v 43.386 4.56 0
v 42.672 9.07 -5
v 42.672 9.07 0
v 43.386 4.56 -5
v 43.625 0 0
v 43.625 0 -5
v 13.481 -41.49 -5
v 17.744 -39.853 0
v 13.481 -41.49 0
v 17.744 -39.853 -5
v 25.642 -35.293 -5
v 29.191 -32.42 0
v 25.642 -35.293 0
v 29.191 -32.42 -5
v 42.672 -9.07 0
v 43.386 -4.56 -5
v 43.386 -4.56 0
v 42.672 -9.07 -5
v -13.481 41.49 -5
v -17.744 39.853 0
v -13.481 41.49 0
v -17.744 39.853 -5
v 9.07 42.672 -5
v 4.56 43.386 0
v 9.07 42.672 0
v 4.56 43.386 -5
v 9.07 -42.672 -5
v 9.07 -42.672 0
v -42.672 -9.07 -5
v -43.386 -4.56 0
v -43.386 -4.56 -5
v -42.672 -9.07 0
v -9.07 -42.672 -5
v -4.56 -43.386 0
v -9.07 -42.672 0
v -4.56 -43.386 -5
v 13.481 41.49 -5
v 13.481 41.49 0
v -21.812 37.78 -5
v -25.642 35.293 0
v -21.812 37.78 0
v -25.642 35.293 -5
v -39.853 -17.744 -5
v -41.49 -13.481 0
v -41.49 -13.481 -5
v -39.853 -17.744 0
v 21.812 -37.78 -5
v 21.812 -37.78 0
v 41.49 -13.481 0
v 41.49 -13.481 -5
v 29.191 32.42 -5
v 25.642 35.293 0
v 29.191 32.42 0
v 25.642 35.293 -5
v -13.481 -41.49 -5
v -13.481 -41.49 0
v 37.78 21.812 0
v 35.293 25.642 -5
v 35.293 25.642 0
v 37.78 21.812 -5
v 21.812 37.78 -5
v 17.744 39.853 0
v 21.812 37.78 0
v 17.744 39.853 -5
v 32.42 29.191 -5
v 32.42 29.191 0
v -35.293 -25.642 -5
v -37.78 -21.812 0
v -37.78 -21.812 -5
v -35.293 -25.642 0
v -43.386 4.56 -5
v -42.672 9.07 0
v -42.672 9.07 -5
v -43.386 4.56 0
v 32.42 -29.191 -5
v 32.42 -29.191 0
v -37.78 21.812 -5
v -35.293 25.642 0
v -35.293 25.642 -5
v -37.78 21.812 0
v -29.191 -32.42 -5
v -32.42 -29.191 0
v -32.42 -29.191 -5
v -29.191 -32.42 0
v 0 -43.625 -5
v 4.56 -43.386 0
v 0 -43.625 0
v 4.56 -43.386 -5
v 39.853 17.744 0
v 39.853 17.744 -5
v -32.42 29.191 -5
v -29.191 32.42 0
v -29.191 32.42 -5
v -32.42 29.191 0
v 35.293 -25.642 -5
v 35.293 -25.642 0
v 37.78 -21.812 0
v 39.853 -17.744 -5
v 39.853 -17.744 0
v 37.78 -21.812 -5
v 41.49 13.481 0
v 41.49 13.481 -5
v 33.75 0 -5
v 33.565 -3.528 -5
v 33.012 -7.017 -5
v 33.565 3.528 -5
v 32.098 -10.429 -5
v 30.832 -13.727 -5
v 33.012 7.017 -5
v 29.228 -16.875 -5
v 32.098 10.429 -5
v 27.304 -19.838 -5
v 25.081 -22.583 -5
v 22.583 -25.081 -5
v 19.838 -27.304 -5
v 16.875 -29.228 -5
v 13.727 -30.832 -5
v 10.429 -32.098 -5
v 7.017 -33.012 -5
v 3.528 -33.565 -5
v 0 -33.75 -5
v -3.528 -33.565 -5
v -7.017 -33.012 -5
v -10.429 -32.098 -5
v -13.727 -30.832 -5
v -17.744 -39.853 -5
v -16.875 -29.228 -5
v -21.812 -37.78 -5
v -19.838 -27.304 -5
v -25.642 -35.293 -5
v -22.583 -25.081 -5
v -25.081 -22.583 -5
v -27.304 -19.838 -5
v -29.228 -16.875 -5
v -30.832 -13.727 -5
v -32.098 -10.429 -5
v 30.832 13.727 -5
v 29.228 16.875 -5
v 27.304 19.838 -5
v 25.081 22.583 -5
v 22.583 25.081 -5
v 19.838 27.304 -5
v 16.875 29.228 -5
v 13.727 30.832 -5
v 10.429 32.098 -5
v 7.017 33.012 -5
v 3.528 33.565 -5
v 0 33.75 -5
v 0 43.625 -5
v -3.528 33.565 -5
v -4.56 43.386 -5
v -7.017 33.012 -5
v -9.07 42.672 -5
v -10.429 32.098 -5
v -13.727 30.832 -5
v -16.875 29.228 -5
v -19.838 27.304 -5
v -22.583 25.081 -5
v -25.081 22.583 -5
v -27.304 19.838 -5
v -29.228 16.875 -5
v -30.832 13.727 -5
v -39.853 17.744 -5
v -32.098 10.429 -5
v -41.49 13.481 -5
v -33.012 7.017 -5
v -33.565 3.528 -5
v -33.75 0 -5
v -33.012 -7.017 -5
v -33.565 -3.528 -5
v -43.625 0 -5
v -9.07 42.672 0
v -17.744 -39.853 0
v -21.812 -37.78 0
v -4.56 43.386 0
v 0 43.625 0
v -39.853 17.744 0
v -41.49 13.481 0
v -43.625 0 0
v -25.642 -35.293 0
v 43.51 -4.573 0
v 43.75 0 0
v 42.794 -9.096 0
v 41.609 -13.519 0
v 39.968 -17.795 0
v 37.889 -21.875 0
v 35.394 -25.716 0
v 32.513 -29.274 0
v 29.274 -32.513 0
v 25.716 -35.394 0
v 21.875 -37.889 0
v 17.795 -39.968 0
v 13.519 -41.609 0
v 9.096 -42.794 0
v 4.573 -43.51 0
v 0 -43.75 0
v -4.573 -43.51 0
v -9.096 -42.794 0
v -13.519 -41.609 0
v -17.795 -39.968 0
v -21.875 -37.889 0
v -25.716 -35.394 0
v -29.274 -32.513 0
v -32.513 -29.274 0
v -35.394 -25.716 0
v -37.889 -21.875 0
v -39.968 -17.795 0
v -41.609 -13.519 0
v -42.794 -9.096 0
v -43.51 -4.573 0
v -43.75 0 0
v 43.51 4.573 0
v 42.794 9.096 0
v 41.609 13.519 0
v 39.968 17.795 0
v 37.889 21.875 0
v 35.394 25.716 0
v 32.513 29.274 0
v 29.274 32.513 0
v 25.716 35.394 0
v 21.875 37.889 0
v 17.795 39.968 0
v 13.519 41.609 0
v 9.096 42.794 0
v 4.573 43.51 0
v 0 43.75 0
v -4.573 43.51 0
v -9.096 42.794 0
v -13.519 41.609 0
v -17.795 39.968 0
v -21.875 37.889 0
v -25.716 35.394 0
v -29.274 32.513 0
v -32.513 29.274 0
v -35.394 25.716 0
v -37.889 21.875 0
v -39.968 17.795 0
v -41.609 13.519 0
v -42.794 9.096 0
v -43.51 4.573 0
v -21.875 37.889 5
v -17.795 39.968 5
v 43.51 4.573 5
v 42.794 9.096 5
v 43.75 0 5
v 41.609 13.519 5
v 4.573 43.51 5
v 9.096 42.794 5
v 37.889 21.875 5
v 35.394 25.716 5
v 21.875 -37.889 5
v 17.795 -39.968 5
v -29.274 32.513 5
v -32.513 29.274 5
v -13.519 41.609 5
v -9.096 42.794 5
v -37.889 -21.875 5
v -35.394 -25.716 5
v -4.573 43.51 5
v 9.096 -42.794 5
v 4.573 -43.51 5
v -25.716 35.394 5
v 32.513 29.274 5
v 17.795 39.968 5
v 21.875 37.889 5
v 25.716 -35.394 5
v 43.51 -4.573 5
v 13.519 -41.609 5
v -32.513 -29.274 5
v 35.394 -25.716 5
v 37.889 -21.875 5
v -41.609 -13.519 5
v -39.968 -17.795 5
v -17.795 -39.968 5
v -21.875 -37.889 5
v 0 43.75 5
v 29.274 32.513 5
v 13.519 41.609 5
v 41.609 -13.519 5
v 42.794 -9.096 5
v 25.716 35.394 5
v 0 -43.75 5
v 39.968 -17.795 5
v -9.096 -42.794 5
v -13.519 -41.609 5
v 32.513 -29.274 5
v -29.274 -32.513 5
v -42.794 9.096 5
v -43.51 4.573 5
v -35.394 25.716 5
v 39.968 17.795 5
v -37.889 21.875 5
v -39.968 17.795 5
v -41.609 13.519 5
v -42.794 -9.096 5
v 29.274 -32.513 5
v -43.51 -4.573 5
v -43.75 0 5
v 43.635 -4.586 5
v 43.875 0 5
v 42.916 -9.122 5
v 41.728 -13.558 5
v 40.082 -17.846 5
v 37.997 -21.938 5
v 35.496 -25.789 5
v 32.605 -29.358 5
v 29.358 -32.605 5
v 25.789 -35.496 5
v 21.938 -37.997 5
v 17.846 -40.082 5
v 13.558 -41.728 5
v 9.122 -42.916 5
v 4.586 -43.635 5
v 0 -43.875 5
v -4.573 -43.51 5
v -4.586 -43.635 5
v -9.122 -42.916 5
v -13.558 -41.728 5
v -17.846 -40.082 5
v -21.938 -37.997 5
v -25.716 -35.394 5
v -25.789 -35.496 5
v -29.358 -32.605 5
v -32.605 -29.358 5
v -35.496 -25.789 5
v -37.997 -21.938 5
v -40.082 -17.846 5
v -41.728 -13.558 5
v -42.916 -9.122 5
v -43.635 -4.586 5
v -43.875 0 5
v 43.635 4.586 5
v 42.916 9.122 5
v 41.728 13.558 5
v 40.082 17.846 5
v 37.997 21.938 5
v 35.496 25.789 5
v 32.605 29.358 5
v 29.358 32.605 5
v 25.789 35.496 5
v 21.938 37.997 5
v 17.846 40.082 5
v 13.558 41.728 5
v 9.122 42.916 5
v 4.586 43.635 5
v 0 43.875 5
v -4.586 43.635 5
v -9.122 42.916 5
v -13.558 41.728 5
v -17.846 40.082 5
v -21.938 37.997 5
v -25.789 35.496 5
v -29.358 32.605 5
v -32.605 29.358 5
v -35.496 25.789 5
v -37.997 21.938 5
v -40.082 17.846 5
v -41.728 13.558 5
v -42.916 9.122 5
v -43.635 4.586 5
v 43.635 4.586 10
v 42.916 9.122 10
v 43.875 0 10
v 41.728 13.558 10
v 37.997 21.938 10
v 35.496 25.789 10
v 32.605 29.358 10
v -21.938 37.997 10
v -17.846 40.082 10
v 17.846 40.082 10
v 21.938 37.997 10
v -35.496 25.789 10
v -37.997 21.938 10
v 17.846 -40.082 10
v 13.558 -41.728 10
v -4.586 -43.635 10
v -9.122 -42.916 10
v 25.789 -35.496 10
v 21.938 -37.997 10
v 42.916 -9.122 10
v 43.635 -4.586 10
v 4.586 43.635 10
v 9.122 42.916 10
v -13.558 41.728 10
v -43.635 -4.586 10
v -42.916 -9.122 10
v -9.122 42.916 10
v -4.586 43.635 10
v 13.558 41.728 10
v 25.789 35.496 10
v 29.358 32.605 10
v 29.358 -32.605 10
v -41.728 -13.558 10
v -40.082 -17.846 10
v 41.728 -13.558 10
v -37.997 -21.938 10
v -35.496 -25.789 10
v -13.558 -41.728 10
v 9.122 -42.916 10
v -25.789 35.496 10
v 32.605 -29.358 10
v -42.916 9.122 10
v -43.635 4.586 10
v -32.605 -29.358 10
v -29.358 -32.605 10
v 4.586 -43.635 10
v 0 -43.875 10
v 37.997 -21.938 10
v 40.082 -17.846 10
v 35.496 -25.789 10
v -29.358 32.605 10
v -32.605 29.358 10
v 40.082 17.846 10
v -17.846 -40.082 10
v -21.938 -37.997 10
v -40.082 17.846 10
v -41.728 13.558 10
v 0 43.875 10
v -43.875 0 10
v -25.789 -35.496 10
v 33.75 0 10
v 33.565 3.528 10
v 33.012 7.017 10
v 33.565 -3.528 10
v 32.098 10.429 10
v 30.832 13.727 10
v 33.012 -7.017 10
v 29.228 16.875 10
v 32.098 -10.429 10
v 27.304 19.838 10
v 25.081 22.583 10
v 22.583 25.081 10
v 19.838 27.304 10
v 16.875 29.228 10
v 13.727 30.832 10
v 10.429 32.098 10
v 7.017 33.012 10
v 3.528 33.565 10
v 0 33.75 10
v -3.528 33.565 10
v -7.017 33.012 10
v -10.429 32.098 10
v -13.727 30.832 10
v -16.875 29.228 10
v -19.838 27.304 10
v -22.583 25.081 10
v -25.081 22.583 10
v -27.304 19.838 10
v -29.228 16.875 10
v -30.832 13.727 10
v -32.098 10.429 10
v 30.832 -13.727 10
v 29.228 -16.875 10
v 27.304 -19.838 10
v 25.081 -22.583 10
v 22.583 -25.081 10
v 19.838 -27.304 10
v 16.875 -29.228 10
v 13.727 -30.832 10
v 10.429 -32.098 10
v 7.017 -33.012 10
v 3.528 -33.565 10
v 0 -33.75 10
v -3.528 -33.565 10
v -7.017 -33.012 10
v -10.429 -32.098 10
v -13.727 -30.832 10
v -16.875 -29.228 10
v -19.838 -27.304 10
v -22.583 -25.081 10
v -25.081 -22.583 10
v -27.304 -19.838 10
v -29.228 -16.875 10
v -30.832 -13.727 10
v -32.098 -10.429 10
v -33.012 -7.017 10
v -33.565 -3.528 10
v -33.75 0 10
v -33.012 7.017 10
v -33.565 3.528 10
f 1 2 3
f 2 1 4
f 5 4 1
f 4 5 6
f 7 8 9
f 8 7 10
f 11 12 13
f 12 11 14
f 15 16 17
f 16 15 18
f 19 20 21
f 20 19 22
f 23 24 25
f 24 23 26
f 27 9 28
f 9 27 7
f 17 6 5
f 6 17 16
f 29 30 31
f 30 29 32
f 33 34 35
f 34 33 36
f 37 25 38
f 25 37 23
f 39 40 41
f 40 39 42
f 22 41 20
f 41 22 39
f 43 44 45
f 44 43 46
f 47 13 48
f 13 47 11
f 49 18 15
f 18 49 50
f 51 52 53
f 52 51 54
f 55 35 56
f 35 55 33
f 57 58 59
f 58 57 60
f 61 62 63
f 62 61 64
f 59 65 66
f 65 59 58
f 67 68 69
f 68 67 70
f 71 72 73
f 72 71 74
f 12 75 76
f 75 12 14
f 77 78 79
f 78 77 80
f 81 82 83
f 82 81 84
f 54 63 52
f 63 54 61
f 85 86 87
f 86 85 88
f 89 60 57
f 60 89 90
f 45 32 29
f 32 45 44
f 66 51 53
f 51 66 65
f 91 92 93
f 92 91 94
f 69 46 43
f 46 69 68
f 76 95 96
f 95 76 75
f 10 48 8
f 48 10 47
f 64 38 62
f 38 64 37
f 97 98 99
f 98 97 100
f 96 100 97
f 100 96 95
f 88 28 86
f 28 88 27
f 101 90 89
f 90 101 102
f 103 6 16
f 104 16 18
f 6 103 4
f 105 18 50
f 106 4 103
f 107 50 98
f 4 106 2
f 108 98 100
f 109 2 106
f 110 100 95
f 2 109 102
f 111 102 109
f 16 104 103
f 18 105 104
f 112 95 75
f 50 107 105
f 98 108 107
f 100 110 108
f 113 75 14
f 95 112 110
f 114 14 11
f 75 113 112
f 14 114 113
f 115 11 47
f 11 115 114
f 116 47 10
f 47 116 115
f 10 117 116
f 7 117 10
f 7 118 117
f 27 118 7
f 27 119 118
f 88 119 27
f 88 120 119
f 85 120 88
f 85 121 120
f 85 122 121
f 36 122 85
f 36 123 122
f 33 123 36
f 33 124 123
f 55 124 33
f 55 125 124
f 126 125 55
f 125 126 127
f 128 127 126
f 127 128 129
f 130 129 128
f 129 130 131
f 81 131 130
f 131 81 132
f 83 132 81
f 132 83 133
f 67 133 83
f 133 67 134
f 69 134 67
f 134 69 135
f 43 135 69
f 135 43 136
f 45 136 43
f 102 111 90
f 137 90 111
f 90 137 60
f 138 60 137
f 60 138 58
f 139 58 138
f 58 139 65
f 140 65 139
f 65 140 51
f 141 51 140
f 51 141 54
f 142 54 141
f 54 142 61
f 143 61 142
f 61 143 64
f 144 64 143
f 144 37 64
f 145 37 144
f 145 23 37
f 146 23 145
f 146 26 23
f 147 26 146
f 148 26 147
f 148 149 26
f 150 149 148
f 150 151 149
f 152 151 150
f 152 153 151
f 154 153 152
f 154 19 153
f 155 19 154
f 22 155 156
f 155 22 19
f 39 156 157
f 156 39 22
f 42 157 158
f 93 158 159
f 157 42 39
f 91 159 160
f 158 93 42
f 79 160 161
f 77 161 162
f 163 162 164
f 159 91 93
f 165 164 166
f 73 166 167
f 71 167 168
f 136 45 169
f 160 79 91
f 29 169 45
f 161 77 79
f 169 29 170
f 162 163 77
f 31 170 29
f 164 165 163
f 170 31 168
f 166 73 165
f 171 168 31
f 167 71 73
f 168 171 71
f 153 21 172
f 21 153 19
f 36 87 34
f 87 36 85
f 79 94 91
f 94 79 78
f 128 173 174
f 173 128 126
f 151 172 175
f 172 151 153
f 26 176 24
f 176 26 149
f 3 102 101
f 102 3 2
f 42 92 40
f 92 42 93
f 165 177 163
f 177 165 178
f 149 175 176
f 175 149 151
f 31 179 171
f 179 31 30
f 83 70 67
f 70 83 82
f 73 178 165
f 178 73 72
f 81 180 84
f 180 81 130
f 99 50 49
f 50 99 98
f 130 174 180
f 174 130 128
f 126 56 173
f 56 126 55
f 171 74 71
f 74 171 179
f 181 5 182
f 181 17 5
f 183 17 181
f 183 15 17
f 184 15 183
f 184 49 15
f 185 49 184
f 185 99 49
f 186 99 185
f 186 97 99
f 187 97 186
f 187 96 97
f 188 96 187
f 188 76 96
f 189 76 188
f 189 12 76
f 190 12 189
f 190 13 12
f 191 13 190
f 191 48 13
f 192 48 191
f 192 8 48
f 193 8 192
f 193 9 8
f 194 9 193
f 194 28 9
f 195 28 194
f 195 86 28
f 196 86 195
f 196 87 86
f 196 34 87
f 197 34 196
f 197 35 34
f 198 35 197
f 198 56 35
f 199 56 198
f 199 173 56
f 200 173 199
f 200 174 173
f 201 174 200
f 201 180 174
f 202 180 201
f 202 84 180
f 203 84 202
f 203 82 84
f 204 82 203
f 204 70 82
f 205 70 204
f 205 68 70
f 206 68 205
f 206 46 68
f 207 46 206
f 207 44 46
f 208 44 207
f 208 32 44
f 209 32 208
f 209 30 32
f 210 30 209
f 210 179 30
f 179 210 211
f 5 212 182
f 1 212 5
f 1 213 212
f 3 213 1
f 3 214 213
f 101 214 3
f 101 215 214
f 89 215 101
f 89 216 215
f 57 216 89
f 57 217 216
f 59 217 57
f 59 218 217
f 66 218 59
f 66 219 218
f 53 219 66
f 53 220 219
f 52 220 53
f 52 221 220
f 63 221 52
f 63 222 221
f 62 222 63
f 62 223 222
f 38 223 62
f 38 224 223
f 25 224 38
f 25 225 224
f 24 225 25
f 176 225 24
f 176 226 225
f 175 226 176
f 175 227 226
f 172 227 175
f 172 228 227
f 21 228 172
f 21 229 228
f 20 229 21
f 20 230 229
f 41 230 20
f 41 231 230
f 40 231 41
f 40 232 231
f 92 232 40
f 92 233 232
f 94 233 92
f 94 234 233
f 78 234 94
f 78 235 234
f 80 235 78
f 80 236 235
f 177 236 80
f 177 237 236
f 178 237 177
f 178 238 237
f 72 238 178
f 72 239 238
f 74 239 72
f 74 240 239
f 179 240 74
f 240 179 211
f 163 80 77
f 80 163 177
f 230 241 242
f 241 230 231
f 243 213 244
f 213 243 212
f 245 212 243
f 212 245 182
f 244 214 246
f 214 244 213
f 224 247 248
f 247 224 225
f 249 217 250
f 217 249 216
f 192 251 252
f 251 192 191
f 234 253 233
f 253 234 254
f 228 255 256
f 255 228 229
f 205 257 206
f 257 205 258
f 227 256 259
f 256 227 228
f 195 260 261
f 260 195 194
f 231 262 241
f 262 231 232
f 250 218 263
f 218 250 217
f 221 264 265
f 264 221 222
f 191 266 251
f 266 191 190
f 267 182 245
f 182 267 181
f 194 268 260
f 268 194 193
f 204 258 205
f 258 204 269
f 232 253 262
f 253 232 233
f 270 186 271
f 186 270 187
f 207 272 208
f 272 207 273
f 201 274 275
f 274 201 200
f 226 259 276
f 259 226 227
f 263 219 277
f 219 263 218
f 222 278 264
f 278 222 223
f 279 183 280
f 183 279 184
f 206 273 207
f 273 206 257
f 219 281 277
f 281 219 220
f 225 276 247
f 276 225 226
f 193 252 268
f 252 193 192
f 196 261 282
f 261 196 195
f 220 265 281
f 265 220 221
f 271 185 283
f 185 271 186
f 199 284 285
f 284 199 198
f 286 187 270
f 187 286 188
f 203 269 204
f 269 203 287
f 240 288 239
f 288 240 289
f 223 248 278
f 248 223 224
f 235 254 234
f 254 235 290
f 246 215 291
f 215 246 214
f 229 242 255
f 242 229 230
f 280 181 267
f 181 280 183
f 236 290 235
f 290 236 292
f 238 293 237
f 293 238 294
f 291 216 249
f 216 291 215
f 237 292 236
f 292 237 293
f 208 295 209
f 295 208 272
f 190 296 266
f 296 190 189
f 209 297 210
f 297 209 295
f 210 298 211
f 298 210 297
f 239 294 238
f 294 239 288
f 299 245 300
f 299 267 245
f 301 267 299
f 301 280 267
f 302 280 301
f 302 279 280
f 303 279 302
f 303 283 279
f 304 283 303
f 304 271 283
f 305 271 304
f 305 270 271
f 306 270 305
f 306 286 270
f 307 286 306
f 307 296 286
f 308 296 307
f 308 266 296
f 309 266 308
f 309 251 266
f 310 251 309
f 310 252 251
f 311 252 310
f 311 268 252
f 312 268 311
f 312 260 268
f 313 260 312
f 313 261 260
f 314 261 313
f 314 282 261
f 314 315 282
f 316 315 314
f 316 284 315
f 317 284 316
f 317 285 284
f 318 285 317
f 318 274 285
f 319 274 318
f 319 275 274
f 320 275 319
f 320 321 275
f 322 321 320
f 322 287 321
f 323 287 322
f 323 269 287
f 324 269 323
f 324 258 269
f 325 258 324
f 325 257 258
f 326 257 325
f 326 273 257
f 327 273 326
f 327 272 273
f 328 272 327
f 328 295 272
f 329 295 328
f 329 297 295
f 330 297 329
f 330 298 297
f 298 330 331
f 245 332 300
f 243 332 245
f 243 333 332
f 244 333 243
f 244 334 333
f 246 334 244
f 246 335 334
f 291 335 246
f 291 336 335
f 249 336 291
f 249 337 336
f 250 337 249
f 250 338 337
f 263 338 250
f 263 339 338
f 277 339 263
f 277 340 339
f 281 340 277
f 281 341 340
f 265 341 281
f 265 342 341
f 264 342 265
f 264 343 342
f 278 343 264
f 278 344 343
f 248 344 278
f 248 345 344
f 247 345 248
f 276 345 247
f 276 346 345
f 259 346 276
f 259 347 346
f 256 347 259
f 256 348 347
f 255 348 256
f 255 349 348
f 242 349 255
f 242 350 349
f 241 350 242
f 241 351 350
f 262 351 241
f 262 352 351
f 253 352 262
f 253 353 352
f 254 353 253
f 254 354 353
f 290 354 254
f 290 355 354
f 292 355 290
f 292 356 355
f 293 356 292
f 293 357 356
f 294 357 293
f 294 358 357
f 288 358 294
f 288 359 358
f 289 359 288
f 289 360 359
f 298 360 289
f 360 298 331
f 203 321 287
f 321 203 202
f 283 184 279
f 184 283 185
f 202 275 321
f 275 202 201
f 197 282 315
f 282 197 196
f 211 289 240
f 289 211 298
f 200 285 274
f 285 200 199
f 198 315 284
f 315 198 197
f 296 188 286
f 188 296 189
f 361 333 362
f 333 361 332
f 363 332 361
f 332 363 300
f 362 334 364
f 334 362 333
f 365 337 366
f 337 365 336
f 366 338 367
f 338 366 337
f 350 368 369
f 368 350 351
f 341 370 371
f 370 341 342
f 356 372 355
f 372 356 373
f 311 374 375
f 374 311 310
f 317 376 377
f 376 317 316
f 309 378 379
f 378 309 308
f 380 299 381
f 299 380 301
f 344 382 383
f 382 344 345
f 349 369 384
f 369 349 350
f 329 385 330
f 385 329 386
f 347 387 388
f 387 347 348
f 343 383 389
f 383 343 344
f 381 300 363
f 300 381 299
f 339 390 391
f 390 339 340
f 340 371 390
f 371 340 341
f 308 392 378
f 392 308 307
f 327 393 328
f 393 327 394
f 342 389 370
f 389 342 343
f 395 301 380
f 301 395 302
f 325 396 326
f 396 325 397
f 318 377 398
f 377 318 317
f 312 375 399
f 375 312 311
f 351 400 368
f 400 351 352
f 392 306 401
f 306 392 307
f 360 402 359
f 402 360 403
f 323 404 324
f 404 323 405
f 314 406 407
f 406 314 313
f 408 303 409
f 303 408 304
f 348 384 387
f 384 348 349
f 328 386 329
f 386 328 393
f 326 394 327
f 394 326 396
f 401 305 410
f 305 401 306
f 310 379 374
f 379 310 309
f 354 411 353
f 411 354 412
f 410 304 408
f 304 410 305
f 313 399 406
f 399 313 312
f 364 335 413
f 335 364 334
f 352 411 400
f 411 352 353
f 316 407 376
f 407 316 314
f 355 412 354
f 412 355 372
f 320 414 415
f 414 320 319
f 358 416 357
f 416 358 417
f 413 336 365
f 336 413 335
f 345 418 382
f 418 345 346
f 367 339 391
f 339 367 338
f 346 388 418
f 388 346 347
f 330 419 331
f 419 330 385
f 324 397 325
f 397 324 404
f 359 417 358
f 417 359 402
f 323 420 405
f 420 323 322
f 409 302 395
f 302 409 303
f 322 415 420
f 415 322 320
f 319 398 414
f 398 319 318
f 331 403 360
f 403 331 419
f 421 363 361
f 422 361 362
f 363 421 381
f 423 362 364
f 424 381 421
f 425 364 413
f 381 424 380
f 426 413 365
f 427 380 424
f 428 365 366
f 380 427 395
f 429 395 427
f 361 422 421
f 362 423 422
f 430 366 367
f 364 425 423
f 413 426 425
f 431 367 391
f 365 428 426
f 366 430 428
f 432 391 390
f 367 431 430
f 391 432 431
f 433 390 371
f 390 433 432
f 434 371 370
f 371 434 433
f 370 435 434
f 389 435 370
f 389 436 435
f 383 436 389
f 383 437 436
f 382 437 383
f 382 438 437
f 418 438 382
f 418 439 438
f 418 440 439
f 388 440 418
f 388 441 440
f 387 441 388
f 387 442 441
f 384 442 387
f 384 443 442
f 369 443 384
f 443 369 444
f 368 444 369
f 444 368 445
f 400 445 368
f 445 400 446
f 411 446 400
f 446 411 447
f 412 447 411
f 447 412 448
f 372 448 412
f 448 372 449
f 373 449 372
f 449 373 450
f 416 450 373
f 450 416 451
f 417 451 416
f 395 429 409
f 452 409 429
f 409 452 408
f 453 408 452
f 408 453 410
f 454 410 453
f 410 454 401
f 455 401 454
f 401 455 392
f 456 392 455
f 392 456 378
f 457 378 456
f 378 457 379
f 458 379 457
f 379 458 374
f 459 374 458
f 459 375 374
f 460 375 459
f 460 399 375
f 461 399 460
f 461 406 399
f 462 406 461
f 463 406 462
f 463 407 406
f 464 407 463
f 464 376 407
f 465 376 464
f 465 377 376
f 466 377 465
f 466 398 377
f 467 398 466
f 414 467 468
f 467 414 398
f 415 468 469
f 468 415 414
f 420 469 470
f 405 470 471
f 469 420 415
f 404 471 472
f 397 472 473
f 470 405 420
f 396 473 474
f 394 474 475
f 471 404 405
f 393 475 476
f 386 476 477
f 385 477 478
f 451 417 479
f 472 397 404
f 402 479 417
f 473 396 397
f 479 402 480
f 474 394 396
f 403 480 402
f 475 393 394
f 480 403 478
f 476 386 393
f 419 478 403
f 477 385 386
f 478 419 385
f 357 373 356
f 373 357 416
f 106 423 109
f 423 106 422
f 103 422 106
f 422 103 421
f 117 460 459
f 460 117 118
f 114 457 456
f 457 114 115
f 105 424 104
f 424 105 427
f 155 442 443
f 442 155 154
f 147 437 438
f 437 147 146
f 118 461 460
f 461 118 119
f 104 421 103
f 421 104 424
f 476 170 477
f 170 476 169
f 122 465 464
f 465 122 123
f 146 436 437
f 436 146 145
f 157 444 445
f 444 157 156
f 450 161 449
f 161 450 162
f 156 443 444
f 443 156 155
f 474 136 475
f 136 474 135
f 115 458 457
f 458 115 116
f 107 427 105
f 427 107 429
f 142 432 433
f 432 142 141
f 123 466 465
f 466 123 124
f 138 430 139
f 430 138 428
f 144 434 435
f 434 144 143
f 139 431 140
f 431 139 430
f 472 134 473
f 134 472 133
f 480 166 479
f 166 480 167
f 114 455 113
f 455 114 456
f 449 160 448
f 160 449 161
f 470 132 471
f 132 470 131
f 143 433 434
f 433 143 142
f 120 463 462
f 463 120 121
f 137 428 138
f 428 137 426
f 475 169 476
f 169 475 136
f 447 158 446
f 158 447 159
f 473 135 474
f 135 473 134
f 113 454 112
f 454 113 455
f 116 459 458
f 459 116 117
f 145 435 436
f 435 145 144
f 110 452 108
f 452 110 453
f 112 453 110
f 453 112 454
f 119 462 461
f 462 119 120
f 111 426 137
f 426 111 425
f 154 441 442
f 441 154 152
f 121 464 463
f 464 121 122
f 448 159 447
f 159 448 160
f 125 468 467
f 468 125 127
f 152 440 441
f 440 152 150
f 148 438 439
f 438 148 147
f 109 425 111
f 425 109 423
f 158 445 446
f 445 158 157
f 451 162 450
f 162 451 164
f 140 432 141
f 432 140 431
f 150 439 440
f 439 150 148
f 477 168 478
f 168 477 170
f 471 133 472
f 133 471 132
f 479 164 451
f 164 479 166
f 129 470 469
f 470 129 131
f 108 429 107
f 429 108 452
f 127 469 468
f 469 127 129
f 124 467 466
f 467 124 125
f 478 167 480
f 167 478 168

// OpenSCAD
// file: qtpy.scad
qtpy_plate  = [18.0, 20.8, 1.6]; // from the adafruit website


module qtpy_model() {
    qtpy_offset = [1.975,  -9.6, -0.78]; // centering the model plate to [0,0,0]
    translate(qtpy_offset)
            import("5426 QT Py ESP32-S3.stl");
}


module _qtpy_mount() {
    intersection() {
        translate([-0.1, 21.2, 0])
        import("QTPy-Case-Bottom.stl");

        translate([0, 7.5, 0])
        cube([26, 16, 12], center=true);
    }
}


module qtpy_mount() {
    for (i=[0,1]) 
        mirror([0, i, 0])
            _qtpy_mount();
}


module qtpy_model_and_mount() {
    translate([0, 0, 2.3]) qtpy_model();
    qtpy_mount();
}
// file: WAGO_221_mount.scad
// ////////////////////////////////////////////////
//
// WAGO 221 mount
//
// Creates a single row or double row set of 221 blocks
// with mounting tabs/ears at either end.
//
// Created - 2017/01/01 by Joo Chung
//
//
// Downloaded from https://www.thingiverse.com/thing:2075219/
//
// - added an extra module `wago_mount(blocks, join=1)` to use it in another project
// - added an extra function `wago_mount_width(blocks)` for calculating the complete mount width
// - fixed warnings about calls to mirror() without vector
// - prefixed all functions and modules with `wago_` as a poor mans implementation of a namespace
// ////////////////////////////////////////////////

// ////////////////////////////////////////////////
// vector of blocks. each element specifies the number of conductors for that block
// EDIT THIS
blocks = [2,2,2,2,2]; // a single 5 conductor blocks
// blocks = [5, 3, 2]; // a set of 5 conductor, 3 conductor, 2 conductor blocks
// blocks = [5, 5, 5]; // a set of three 5 conductor blocks
// blocks = [2]; // a single 2 conductor block
// blocks = [3]; // a single 3 conductor block


// ////////////////////////////////////////////////
// Mirror the mount, stand it up, and put tabs on bottom.
// 0 - no mirror, 1 - mirror, rotate so its standing up, and reposition tabs
// 2 - mirror, rotate so that they are laying flat, and reposition tabs.
// EDIT THIS
body_shape = 0;

// ////////////////////////////////////////////////
// Tabs - include or exclude mounting tabs
// EDIT THIS: 0 - no tabs, 1 - tabs
tabs      =  1;
// EDIT THIS: radius of hole in tab
tabradius =  2.6;
// EDIT THIS: thickness of tab
tabheight =  4;
// EDIT THIS: Set width and length of the tab. (tab is basically a square)
tabwidth  = 10;



// ////////////////////////////////////////////////
// Block dimensions in mm -- DO NOT EDIT
conwidth   =  5.6; // width of a single conductor
// DO NOT EDIT
border     =  1.75; // block transparent plastic border
// DO NOT EDIT
blockdepth = 18.25;
// DO NOT EDIT
fudge      =  0.2;


// ////////////////////////////////////////////////
// OpenSCAD special variables -- DO NOT EDIT
$fa = 1;
// DO NOT EDIT
$fs = 0.4;


// ////////////////////////////////////////////////
// Functions

// block width
function wago_bw(x) = conwidth*x+border+fudge;

// mount width (list of blocks, index, max index)
function wago_mw(block_list, i, n) = ( i==0 ? wago_bw(block_list[i]) + 2 + wago_mw(block_list, i+1, n) : (i < n ? wago_bw(block_list[i]) + 2 + wago_mw(block_list, i+1, n) : 0));

// full mount width, including closing wall
function wago_mount_width(block_list) = wago_mw(block_list, 0, len(block_list))+ 2;

// ////////////////////////////////////////////////
// Modules

module wago_tab(width, hole, thickness) {
    difference() {
        union () {
            cylinder(thickness,width/2,width/2, true);
            translate([width/4,0,0]) cube([width/2,width,thickness], true);
        }
    cylinder(width,hole,hole, true);
    }
}


module wago_shoulder (depth) {
    difference () {
        union () {
            cube([2, blockdepth, 3.25], false);
            translate([0,0,3.25]) cube([2.25, blockdepth, 2], false);
        }
        translate([0,0,2]) cube([2.25,2,3.25], false);
        translate([2,blockdepth-4,2]) cube([0.25,4,3.25], false);
    }
}


module wago_backshoulder (height) {
    difference() {
        union() {
            translate([0, 2, 0]) cube ([2, 1.25, 10.15]);
            cube ([2.25, 2, 10.15]);
        }
        translate([0,0,10.15-2]) cube([2.25,3.25,2]);
        translate([2,0,2]) cube([1.25,3.25,3.25]);
    }
}


// WAGO 221 block
module wago_block (nconn) {
    blockwidth = wago_bw(nconn);

    // base
    translate([2,2,0]) cube([blockwidth, blockdepth, 2], false);

    // back headboard
    translate([0,blockdepth+2,0]) cube([blockwidth+4, 2, 10.15], false);

    // back lip
    translate([0,blockdepth,10.15]) cube([blockwidth+4, 4, 2], false);

    // front lip
    //translate([0,0,0]) cube([blockwidth+4, 2, 2.5], false);

    // left shoulder and right shoulders
    translate([0,2,0]) wago_shoulder();
    translate([blockwidth+4,2,0]) mirror([1,0,0]) wago_shoulder();

    // back left and shoulder
    translate([0, blockdepth-1.25, 0]) wago_backshoulder();
    translate([blockwidth+4, blockdepth -1.25, 0]) mirror([1,0,0]) wago_backshoulder();

}


module wago_mount(block_list=blocks, join=1) {
    // a single strip of wago mounts for use in other projects

    cut_size = [wago_mount_width(block_list) + 2, blockdepth + 4, 15];

    difference() {
        // mount, as defined by the original module
        translate([0, -2, -2])
            for (i=[0:len(block_list)-1]) {
                offset = (i==0) ? 0 : wago_mw(block_list, 0, i);
                translate([offset, 0, 0]) wago_block(block_list[i]);
            }

        // cut off excess material
        translate([-1, blockdepth + join, -3])
            cube(cut_size);
        translate([-1, -1, -cut_size.z - join])
            cube(cut_size);
    }
}



// ////////////////////////////////////////////////
// MAIN BODY
mountwidth=wago_mw(blocks, 0, len(blocks));
if (body_shape==0) { // No mirror. Single row of blocks
    // create array of blocks
    for (i=[0:len(blocks)-1]) {
        offset = (i==0) ? tabwidth : tabwidth + wago_mw(blocks, 0, i);
        translate([offset, 0, 0]) wago_block(blocks[i]);
    }

    // left and right tabs
    if (tabs==1) {
        translate([tabwidth/2,(blockdepth+4)/2,tabheight/2]) wago_tab (tabwidth, tabradius, tabheight);
        translate([mountwidth+2+tabwidth+tabwidth/2,(blockdepth+4)/2,tabheight/2]) mirror([1,0,0]) wago_tab (tabwidth, tabradius, tabheight);
    }
} else if (body_shape==1) { // Mirrored. two rows of blocks, back to back.
    // Row #1. Stand up on headboard.
    rotate([-90,0,0]) for (i=[0:len(blocks)-1]) {
        offset = (i==0) ? tabwidth : tabwidth + wago_mw(blocks, 0, i);
        translate([offset, 0, -1]) wago_block(blocks[i]);
    }

    // Row #2. Opposite rotation. Stand up on headbord
    rotate([90,0,0]) mirror ([0, 1, 0]) for (i=[0:len(blocks)-1]) {
        offset = (i==0) ? tabwidth : tabwidth + wago_mw(blocks, 0, i);
        translate([offset, 0, -1]) wago_block(blocks[i]);
    }

    // left and right tabs
    if (tabs==1) {
        translate([tabwidth/2,0,-blockdepth-tabheight/2]) wago_tab (tabwidth, tabradius, tabheight);
        translate([mountwidth+2+tabwidth+tabwidth/2,0,-blockdepth-tabheight/2]) mirror([1,0,0]) wago_tab (tabwidth, tabradius, tabheight);
    }
} else if (body_shape==2) {
    // Row #1.
    for (i=[0:len(blocks)-1]) {
        offset = (i==0) ? tabwidth : tabwidth + wago_mw(blocks, 0, i);
        translate([offset, -blockdepth-6, -1]) wago_block(blocks[i]);
    }

    // Row #2. Flip
    mirror ([0, 1, 0]) for (i=[0:len(blocks)-1]) {
        offset = (i==0) ? tabwidth : tabwidth + wago_mw(blocks, 0, i);
        translate([offset, -blockdepth, -1]) wago_block(blocks[i]);
    }

    // left and right tabs
    if (tabs==1) {
        translate([tabwidth/2,-3,(tabheight-2)/2]) wago_tab (tabwidth, tabradius, tabheight);
        translate([mountwidth+2+tabwidth+tabwidth/2,-3,(tabheight-2)/2]) mirror([1,0,0]) wago_tab (tabwidth, tabradius, tabheight);
    }
}
// file: dimensions.scad
$fn = 60;

// led strip

led_strip_width         = 12.0;  // mm
led_strip_height        =  4.0;  // mm

led_strip_clutch_length =  5.0;  // mm
led_strip_clutch_height =  1.5;  // mm

led_strip_end_length    = 22.0;  // mm
led_strip_end_width     = 14.0;  // mm
led_strip_end_height    =  6.5;  // mm

led_wire_diameter       =  1.8;  // mm
led_wire_length         = 90.0;   // mm
led_wire_sort_distance  = 15.0;   // mm

led_wire_clutch_width   =  9.0;  // mm
led_wire_clutch_length  = 15.0;  // mm
led_wire_clutch_height  = led_wire_diameter;  // mm

led_length_requirements = (
      led_strip_clutch_length  // led clutch area
    + led_strip_end_length     // led end cap
    + led_wire_sort_distance   // sorting the wires to a ribbon cable
    + led_wire_sort_distance   // clamping the wires down
    + led_wire_sort_distance   // bending the wires around
);

// cases

case_wall      =  2.0; // mm
case_plate     =  2.0; // mm
case_z_radius  =  1.0; // mm, horizontal edge radius


// screws - M3 machine screws, roughly measured

screw_shaft_diameter   = 3.0; // mm
screw_head_diameter    = 5.5; // mm
screw_head_height      = 3.0; // mm
screw_shaft_max_length = 20; // mm

screw_nut_diameter   = 6.0; // mm
screw_nut_height     = 2.2; // mm

screw_hole_slack     = 0.2 * 2; // mm


screw_pillar_diameter = screw_nut_diameter +  2 * case_wall;
screw_pillar_radius   = screw_pillar_diameter / 2;
screw_shaft_radius    = screw_shaft_diameter / 2;



// hook case

// the z height depends also on the screw length, check comment
hook_case_outer = [
    led_strip_end_width + 2 * screw_pillar_diameter,
    led_length_requirements + case_wall,            // only one, the second is used to clutch the led strip
    (
        10.0                                        // mm inner height needed for bending the cables
      + case_plate * 2                              // top and bottom plate
      +  1.0                                        // to get to (10 + 2*2 + 1) = 15 - screw_head_height = 12 mm screws
    )
];

hook_case_inner = hook_case_outer - 2 * [case_wall, case_wall, case_plate];
hook_case_pillar_center = hook_case_outer - [screw_pillar_diameter, screw_pillar_diameter, screw_pillar_diameter];


// the wire clutch for a case

wire_clutch_clamp_block_width  =  5.0; // mm
wire_clutch_clamp_slide_length =  5.0; // mm
wire_clutch_assembly_offset    = led_length_requirements - 2 * led_wire_sort_distance;


// usb-c connector cutout
usb_c_connector = [13.5, 9.0, 5.3]; // mmm


// qtpy

qtpy_clearance_usb   = 1.2;      // mm, the usb-c part sticks out of the plate
qtpy_clearance_upper = 3.5;      // mm, leave at least this much space above the plate
qtpy_clearance_lower = 1.5;      // mm, leave at least this much space below the plate


// measured from prusa spools

spool_inner_diameter      = 87.5;  // mm, measured
spool_inner_height        = 20.0;  // mm, measured
spool_inner_ring_height   =  5.0;  // mm, measured


// some assumptions from my side

spool_case_taper        =  0.25; // mm, amount of height added to have a slope for the spools to stick on
spool_case_corner       =  1;    // mm, corner radius of the case
spool_case_rim_height   =  2;    // mm, the hight of the rim of the cases fitting into each other
spool_case_rim_slack    =  0.1;  // mm, give the rim a little slack
spool_protection_bulge  = 50;    // mm, diameter for led protection bulge


// calculations

spool_inner_net_height  = spool_inner_height - spool_inner_ring_height;
spool_case_strip_height = led_strip_width + 10;  // give a little leeway
spool_case_height       = spool_case_strip_height + spool_inner_net_height * 2;

spool_case_cut        = led_strip_height / 2; 

spool_case_diameter = spool_inner_diameter;
spool_case_radius = spool_inner_diameter / 2;


// helper vector to cut the spool case

spool_cutter = [spool_case_diameter + 2, spool_case_diameter + 2, spool_case_diameter + 2];




module rounded_edge(length=20, radius=5, slack=0.25) {
    offset_vector = [radius, radius, length] / 2;
    translate(-offset_vector)
        difference() {
            cube([radius + slack, radius + slack, length]);
            translate([0, 0, -1])
                cylinder(length + 2, r=radius);
        }
}
// main file
include <dimensions.scad>


use <WAGO_221_mount.scad>
// wago_mount([5,2]);


module test_usb_c_holes() {

    wall = 2;

    tight = [13.5, 9, 5.3];
    between = 10;

    function diff(n) = (n * (tight.z + between) + between/2);

    translate([0, 0, 2])
        rotate([-90, 0, 0])
            difference() {
                cube([tight.x * 2, 2, 80]);

                translate([tight.x/2, -1, diff(0)])
                    cube(tight);

                translate([tight.x/2, -1, diff(1)])
                    cube(tight + [0.25, 0.25, 0.25]);

                translate([tight.x/2, -1, diff(2)])
                    cube(tight + [0.5, 0.5, 0.5]);

                translate([tight.x/2, -1, diff(3)])
                    cube(tight + [0.75, 0.75, 0.75]);

                translate([tight.x/2, -1, diff(4)])
                    cube(tight + [1, 1, 1]);
            }

    translate([0, 0, 0])
        rotate([90, 0, 0])
            difference() {
                cube([tight.x * 2, 1, 80]);

                translate([tight.x/2, -1, diff(0)])
                    cube(tight);

                translate([tight.x/2, -1, diff(1)])
                    cube(tight + [0.25, 0.25, 0.25]);

                translate([tight.x/2, -1, diff(2)])
                    cube(tight + [0.5, 0.5, 0.5]);

                translate([tight.x/2, -1, diff(3)])
                    cube(tight + [0.75, 0.75, 0.75]);

                translate([tight.x/2, -1, diff(4)])
                    cube(tight + [1, 1, 1]);
            }
}
// test_usb_c_holes();
/*
use <qtpy.scad>
translate([0, 0, 2])
    qtpy_mount();
cube([35, 35, 4], center=true);
*/
difference() {
    for (d=[-1,0,1]) {
        h = 5;
        off = d*h;
        delta = 0.25*d;
        dia =spool_case_diameter + delta;
        echo(dia)
        translate([0,0,off])
            cylinder(h=h, d=dia);
    }
    translate([0,0,-50])
        cylinder(h=100, d=spool_case_diameter - 20);
}
